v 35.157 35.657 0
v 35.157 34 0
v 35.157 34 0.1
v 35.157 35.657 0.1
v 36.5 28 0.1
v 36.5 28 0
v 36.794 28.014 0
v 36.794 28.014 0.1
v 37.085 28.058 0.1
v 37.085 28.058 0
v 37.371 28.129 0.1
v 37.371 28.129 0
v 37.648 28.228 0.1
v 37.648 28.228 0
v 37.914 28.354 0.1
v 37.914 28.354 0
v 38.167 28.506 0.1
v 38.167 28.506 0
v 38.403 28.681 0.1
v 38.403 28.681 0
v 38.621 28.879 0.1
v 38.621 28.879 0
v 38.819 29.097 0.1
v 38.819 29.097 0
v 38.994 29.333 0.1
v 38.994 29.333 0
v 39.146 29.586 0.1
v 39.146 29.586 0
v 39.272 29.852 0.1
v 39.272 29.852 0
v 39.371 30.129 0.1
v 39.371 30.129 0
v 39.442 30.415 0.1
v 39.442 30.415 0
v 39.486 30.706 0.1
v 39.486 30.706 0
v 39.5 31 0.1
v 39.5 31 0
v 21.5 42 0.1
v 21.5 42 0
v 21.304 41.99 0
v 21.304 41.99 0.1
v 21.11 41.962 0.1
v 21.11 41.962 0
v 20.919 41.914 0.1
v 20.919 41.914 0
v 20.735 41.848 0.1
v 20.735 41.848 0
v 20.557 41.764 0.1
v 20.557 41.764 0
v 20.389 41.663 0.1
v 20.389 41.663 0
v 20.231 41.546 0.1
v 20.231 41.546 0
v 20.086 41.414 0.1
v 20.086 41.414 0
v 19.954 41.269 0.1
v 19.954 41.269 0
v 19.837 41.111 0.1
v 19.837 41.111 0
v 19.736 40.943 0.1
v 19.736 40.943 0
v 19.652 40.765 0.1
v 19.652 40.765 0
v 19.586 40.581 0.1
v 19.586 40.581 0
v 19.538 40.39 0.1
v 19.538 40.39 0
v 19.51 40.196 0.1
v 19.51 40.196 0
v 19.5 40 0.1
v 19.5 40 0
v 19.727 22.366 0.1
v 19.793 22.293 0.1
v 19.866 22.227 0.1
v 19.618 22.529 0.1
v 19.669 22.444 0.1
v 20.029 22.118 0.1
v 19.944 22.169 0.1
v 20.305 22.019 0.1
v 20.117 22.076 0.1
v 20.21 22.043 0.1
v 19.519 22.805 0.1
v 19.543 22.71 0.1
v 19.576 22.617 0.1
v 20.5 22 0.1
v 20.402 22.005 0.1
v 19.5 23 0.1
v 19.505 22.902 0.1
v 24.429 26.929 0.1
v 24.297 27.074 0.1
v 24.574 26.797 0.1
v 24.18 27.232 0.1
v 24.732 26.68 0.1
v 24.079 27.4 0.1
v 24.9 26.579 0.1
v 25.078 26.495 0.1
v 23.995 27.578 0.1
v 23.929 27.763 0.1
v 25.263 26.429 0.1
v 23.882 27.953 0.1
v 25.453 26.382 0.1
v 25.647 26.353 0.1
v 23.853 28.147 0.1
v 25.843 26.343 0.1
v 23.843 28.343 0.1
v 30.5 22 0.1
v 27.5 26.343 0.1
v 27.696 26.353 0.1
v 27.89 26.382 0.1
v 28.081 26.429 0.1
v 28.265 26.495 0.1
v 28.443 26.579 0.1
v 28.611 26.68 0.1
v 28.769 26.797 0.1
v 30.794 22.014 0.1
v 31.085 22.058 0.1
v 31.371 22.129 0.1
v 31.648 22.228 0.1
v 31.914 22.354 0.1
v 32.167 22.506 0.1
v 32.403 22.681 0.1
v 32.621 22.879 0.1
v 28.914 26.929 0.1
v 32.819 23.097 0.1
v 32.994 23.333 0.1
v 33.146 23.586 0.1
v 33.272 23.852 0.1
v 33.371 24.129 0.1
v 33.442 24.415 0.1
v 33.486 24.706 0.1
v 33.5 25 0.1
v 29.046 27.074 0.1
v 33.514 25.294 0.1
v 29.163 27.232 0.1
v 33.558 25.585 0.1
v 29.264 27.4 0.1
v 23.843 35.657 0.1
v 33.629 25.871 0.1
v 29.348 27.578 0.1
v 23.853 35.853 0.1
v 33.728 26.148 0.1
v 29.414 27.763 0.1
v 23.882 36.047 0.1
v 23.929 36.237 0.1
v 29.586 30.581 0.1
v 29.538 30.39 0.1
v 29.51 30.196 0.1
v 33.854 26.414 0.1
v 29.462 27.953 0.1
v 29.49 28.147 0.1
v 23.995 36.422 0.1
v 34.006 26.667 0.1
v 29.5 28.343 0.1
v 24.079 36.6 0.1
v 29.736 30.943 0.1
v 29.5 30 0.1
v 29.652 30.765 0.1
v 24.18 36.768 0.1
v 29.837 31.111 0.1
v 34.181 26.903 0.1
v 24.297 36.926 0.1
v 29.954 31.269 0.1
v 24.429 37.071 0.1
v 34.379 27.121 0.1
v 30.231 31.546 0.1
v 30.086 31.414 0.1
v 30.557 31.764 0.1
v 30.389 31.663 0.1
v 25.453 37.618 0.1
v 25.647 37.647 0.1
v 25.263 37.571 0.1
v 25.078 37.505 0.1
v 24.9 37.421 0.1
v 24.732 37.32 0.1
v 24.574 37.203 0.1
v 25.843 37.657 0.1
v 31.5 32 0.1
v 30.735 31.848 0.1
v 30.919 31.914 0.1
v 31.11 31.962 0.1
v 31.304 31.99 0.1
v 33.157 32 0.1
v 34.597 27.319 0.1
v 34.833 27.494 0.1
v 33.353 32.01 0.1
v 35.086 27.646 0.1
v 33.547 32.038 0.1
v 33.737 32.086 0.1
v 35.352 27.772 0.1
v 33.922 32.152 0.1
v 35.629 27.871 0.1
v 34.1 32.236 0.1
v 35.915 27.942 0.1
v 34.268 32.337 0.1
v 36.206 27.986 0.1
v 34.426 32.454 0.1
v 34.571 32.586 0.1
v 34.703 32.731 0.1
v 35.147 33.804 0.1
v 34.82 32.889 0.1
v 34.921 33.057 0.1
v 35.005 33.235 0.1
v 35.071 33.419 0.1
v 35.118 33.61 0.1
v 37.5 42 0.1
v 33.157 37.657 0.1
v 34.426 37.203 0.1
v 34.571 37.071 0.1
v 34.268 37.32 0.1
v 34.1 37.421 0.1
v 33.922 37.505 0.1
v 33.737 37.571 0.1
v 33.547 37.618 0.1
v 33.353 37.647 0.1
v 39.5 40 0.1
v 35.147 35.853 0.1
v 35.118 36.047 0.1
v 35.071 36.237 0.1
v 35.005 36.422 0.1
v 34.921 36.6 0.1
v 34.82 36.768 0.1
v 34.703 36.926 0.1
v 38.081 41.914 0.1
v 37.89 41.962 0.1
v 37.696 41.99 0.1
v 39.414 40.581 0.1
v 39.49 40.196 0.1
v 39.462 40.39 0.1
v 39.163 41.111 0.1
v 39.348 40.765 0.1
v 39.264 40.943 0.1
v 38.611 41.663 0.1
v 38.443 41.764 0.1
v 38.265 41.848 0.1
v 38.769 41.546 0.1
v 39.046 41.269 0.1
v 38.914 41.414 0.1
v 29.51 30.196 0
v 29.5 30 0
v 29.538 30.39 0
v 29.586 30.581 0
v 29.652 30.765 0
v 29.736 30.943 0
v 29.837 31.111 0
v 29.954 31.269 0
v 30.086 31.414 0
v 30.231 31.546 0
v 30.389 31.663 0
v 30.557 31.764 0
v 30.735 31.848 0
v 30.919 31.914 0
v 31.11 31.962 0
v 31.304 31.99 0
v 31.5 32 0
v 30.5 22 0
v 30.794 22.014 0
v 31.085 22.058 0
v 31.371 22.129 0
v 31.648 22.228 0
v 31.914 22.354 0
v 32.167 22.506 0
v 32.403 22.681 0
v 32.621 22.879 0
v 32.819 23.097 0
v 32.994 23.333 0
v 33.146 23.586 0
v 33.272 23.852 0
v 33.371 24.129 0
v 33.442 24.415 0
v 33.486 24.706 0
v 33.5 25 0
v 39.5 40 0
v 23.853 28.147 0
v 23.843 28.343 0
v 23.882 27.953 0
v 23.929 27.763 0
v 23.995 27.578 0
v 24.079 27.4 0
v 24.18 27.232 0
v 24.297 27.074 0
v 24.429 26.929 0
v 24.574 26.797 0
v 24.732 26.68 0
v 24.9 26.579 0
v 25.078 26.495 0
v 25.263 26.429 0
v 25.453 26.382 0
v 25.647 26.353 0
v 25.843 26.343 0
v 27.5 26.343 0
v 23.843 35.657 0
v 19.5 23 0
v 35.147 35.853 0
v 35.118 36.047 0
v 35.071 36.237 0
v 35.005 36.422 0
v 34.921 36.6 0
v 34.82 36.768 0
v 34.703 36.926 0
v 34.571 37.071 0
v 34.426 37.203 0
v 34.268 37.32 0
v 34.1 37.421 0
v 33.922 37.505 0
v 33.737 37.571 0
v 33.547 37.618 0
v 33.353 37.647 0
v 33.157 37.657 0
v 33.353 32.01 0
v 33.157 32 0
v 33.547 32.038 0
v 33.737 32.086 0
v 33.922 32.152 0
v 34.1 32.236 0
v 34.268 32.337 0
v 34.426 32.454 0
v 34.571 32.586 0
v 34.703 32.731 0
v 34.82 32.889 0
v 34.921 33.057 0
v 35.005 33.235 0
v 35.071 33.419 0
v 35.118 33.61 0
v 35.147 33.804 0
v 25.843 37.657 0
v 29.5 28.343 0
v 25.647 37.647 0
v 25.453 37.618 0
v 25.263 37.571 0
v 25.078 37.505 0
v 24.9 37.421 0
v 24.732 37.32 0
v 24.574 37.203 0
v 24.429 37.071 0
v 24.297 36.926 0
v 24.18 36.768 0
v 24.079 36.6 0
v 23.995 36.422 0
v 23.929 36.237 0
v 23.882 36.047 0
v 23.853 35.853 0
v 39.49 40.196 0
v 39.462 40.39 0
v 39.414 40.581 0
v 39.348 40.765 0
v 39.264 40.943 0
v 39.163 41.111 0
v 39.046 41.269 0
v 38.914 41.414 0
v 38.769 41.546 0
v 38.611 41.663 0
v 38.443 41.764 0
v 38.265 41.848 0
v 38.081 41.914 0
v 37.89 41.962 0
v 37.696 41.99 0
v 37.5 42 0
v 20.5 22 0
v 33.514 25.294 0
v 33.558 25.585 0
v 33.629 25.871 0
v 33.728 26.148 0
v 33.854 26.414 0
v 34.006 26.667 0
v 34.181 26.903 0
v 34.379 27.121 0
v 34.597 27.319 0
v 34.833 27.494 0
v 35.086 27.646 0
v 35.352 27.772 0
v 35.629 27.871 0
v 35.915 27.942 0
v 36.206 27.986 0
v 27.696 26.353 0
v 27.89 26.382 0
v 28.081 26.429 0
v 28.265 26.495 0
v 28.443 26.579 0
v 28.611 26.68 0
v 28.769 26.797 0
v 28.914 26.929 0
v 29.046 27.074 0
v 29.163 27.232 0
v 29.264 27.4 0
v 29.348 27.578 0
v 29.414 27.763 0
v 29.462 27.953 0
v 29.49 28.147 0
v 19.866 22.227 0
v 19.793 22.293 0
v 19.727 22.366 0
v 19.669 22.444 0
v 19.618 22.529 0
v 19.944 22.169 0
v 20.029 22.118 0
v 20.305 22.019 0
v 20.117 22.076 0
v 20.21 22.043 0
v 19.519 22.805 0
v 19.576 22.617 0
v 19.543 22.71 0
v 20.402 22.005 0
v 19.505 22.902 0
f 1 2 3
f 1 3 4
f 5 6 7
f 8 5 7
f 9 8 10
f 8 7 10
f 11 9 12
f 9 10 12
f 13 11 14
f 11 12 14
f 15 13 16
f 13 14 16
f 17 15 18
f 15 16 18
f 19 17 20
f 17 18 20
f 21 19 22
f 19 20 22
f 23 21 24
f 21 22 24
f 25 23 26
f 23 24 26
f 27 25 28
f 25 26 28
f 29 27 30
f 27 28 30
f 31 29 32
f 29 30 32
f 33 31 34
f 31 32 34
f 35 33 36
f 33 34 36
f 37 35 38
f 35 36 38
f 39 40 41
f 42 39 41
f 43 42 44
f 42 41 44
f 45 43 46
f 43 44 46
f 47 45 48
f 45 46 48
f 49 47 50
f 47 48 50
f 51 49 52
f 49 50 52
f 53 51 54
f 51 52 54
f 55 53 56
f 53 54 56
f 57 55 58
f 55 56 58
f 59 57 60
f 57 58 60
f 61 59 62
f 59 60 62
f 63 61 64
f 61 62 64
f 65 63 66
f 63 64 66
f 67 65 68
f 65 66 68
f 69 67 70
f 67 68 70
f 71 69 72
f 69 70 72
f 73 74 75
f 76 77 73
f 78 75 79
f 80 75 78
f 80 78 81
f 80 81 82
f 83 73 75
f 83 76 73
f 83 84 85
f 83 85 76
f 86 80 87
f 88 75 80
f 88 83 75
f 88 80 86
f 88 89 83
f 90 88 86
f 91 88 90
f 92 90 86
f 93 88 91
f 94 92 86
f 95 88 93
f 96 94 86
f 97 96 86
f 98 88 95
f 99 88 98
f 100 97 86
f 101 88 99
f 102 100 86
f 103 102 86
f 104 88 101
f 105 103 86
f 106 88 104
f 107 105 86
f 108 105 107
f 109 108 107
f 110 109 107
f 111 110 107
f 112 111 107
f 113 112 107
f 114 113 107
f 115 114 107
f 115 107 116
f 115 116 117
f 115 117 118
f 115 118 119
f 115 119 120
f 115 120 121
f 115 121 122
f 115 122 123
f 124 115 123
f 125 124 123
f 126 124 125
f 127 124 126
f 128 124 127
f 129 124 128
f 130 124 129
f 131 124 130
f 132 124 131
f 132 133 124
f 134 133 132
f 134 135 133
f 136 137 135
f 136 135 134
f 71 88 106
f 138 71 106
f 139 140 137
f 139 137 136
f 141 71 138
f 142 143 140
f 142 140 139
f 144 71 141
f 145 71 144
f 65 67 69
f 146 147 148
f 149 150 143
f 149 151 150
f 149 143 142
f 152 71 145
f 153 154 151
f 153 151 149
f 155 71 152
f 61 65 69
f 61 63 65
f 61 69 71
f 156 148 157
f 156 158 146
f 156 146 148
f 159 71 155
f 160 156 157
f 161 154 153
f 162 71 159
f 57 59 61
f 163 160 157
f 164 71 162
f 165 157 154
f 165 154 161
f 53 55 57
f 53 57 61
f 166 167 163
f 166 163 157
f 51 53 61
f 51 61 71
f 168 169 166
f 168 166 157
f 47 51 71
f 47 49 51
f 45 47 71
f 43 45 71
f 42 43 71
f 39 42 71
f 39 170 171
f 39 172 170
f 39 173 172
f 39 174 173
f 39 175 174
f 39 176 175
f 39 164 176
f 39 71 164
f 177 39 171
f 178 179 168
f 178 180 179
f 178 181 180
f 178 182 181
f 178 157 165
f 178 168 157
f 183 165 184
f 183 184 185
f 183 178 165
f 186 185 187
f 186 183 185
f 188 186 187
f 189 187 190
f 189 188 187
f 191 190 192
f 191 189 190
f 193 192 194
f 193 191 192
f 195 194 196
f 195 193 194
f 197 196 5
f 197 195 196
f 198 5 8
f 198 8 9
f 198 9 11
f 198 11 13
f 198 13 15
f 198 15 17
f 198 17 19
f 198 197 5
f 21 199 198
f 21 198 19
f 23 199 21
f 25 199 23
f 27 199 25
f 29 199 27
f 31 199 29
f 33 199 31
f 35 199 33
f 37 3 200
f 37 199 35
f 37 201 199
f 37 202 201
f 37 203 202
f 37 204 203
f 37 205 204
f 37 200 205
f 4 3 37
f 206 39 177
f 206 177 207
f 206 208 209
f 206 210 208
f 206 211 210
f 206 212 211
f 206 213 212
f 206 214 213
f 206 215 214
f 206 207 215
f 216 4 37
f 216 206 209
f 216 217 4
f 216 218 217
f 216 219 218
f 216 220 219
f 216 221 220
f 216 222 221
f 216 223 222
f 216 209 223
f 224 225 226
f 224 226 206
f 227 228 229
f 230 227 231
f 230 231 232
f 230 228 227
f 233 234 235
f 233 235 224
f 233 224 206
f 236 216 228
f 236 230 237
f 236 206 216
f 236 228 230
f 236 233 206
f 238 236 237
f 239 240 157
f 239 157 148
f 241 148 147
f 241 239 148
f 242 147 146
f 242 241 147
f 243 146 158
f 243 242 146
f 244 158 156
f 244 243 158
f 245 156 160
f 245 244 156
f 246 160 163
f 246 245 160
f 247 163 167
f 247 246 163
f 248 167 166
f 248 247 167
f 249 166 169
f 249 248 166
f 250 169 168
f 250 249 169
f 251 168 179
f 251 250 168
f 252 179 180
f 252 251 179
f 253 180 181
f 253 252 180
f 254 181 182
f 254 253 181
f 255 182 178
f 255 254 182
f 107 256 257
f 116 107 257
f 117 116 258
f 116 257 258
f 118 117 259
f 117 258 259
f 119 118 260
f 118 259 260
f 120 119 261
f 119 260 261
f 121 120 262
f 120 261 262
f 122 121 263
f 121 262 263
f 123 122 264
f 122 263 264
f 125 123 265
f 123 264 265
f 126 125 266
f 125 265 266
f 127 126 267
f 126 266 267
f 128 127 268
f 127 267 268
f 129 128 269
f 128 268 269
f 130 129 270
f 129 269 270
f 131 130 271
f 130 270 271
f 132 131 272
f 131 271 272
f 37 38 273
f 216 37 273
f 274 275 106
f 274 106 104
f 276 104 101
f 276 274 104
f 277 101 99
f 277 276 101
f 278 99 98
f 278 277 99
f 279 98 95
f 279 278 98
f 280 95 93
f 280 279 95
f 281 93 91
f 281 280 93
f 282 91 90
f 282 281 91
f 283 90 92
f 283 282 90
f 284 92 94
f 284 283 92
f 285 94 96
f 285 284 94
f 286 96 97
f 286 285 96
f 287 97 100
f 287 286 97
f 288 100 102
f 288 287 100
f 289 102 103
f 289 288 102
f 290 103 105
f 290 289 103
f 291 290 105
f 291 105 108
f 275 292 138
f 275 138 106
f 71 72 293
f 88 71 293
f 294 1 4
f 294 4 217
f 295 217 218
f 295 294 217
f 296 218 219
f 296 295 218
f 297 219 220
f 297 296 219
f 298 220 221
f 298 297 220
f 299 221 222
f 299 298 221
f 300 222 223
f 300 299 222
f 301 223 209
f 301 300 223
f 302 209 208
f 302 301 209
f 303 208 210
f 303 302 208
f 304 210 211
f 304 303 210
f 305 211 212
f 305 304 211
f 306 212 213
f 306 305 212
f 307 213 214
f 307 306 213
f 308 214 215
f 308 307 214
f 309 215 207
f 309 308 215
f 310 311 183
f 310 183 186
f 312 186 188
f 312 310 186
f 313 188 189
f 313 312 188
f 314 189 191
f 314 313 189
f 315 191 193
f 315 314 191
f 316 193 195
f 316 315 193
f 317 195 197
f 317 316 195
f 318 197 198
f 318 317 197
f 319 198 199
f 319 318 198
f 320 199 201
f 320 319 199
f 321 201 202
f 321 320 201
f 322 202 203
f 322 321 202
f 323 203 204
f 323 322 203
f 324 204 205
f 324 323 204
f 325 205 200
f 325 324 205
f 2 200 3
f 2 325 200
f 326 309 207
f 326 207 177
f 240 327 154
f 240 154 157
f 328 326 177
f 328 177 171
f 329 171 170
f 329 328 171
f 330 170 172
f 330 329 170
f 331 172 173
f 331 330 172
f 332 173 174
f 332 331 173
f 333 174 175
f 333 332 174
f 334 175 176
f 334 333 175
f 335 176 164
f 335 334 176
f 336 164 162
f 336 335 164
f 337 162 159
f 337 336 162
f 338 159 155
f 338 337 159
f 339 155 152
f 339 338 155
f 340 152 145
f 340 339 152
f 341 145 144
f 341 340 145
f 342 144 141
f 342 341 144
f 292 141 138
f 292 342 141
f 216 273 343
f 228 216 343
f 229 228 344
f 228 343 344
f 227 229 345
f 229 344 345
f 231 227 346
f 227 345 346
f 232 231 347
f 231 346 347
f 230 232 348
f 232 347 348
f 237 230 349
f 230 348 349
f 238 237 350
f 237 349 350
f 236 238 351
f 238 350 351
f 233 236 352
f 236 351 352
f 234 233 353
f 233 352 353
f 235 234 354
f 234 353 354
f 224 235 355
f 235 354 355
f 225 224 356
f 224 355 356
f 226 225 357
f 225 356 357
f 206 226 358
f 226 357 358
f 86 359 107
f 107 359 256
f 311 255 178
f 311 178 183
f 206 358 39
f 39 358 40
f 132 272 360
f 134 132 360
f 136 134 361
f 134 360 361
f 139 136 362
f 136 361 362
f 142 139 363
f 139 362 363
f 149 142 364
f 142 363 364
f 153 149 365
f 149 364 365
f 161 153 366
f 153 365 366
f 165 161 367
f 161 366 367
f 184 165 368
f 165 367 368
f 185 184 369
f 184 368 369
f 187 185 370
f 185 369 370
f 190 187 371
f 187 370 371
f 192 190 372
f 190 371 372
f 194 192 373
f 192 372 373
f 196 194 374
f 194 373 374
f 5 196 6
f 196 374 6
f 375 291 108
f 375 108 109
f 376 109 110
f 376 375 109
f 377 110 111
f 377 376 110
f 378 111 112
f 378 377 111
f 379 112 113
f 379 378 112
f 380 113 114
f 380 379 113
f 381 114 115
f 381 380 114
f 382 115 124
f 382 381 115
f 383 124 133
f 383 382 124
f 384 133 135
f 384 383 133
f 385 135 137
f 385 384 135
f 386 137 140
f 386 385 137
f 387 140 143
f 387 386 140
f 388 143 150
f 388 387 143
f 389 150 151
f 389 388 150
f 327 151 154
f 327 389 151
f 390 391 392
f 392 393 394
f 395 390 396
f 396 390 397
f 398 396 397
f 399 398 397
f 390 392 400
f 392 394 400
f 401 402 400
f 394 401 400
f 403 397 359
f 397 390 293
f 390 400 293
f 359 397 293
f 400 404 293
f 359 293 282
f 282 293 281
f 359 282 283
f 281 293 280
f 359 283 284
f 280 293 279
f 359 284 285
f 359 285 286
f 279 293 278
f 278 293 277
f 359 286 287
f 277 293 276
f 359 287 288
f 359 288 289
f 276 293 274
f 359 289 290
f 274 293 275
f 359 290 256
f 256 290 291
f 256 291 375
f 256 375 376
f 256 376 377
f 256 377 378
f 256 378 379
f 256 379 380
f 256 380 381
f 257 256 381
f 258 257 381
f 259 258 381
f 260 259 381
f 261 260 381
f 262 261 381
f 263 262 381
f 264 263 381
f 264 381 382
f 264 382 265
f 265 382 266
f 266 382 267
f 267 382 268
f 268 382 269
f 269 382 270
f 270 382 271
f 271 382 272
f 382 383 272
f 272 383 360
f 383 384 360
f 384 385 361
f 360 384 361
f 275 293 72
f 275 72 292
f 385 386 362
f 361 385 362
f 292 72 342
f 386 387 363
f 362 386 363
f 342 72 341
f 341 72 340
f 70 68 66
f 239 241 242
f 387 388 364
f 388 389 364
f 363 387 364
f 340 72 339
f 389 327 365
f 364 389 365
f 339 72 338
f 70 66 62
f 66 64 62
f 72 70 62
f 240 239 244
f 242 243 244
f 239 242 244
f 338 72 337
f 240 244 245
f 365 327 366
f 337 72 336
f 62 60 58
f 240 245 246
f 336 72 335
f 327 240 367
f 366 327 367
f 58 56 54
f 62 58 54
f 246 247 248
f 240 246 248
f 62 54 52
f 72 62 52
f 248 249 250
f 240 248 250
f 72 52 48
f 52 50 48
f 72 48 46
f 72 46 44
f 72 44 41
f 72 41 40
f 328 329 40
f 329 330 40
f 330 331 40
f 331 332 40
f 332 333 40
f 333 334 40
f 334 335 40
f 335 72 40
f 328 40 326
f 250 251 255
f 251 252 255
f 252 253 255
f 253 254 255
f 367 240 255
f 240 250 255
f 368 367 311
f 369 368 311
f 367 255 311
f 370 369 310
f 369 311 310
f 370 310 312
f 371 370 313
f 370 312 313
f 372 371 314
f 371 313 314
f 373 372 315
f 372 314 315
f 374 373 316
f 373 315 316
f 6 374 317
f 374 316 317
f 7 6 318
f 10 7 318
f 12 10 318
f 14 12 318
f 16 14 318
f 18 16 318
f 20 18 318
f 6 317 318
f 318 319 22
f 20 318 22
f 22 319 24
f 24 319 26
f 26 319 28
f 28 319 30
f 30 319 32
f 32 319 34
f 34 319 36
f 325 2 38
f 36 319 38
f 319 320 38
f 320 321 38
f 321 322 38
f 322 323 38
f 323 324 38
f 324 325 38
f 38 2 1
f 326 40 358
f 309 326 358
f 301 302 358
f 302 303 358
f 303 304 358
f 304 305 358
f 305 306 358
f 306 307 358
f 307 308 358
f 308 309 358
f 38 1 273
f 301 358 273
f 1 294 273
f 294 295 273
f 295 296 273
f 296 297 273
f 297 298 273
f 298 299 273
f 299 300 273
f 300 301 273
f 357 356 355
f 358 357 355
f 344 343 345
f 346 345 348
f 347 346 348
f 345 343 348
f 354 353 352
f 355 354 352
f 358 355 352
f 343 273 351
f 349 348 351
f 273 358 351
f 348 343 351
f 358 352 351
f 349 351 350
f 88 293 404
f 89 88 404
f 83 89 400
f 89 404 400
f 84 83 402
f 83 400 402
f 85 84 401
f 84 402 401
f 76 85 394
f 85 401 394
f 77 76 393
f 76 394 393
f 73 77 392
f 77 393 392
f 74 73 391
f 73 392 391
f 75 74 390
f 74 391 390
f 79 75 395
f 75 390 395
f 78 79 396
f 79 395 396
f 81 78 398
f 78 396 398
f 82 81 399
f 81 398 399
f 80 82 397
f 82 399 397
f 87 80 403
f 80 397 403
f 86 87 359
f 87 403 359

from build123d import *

# Parameters (mm, degrees)
SALIENTE_EXTRUIR1_DEPTH = 0.1


with BuildPart() as part:
    # Model → Saliente-Extruir1 (new body)
    with BuildSketch(Plane.XY):
        with BuildLine():
            Line((20.5, 22), (28.5, 22))
            Line((28.5, 22), (30.5, 22))
            ThreePointArc((30.5, 22), (32.621320344, 22.878679656), (33.5, 25))
            ThreePointArc((33.5, 25), (34.378679656, 27.121320344), (36.5, 28))
            ThreePointArc((36.5, 28), (38.621320344, 28.878679656), (39.5, 31))
            Line((39.5, 31), (39.5, 33))
            Line((39.5, 33), (39.5, 40))
            ThreePointArc((39.5, 40), (38.914213562, 41.414213562), (37.5, 42))
            Line((37.5, 42), (21.5, 42))
            ThreePointArc((21.5, 42), (20.085786438, 41.414213562), (19.5, 40))
            Line((19.5, 40), (19.5, 23))
            ThreePointArc((19.5, 23), (19.792893219, 22.292893219), (20.5, 22))
        make_face()
        with BuildLine():
            Line((31.5, 32), (33.156854249, 32))
            ThreePointArc((33.156854249, 32), (34.571067812, 32.585786438), (35.156854249, 34))
            Line((35.156854249, 34), (35.156854249, 35.656854249))
            ThreePointArc((35.156854249, 35.656854249), (34.571067812, 37.071067812), (33.156854249, 37.656854249))
            Line((33.156854249, 37.656854249), (25.843145751, 37.656854249))
            ThreePointArc((25.843145751, 37.656854249), (24.428932188, 37.071067812), (23.843145751, 35.656854249))
            Line((23.843145751, 35.656854249), (23.843145751, 28.343145751))
            ThreePointArc((23.843145751, 28.343145751), (24.428932188, 26.928932188), (25.843145751, 26.343145751))
            Line((25.843145751, 26.343145751), (27.5, 26.343145751))
            ThreePointArc((27.5, 26.343145751), (28.914213562, 26.928932188), (29.5, 28.343145751))
            Line((29.5, 28.343145751), (29.5, 30))
            ThreePointArc((29.5, 30), (30.085786438, 31.414213562), (31.5, 32))
        make_face(mode=Mode.SUBTRACT)
    extrude(amount=SALIENTE_EXTRUIR1_DEPTH)


solid = part.part
